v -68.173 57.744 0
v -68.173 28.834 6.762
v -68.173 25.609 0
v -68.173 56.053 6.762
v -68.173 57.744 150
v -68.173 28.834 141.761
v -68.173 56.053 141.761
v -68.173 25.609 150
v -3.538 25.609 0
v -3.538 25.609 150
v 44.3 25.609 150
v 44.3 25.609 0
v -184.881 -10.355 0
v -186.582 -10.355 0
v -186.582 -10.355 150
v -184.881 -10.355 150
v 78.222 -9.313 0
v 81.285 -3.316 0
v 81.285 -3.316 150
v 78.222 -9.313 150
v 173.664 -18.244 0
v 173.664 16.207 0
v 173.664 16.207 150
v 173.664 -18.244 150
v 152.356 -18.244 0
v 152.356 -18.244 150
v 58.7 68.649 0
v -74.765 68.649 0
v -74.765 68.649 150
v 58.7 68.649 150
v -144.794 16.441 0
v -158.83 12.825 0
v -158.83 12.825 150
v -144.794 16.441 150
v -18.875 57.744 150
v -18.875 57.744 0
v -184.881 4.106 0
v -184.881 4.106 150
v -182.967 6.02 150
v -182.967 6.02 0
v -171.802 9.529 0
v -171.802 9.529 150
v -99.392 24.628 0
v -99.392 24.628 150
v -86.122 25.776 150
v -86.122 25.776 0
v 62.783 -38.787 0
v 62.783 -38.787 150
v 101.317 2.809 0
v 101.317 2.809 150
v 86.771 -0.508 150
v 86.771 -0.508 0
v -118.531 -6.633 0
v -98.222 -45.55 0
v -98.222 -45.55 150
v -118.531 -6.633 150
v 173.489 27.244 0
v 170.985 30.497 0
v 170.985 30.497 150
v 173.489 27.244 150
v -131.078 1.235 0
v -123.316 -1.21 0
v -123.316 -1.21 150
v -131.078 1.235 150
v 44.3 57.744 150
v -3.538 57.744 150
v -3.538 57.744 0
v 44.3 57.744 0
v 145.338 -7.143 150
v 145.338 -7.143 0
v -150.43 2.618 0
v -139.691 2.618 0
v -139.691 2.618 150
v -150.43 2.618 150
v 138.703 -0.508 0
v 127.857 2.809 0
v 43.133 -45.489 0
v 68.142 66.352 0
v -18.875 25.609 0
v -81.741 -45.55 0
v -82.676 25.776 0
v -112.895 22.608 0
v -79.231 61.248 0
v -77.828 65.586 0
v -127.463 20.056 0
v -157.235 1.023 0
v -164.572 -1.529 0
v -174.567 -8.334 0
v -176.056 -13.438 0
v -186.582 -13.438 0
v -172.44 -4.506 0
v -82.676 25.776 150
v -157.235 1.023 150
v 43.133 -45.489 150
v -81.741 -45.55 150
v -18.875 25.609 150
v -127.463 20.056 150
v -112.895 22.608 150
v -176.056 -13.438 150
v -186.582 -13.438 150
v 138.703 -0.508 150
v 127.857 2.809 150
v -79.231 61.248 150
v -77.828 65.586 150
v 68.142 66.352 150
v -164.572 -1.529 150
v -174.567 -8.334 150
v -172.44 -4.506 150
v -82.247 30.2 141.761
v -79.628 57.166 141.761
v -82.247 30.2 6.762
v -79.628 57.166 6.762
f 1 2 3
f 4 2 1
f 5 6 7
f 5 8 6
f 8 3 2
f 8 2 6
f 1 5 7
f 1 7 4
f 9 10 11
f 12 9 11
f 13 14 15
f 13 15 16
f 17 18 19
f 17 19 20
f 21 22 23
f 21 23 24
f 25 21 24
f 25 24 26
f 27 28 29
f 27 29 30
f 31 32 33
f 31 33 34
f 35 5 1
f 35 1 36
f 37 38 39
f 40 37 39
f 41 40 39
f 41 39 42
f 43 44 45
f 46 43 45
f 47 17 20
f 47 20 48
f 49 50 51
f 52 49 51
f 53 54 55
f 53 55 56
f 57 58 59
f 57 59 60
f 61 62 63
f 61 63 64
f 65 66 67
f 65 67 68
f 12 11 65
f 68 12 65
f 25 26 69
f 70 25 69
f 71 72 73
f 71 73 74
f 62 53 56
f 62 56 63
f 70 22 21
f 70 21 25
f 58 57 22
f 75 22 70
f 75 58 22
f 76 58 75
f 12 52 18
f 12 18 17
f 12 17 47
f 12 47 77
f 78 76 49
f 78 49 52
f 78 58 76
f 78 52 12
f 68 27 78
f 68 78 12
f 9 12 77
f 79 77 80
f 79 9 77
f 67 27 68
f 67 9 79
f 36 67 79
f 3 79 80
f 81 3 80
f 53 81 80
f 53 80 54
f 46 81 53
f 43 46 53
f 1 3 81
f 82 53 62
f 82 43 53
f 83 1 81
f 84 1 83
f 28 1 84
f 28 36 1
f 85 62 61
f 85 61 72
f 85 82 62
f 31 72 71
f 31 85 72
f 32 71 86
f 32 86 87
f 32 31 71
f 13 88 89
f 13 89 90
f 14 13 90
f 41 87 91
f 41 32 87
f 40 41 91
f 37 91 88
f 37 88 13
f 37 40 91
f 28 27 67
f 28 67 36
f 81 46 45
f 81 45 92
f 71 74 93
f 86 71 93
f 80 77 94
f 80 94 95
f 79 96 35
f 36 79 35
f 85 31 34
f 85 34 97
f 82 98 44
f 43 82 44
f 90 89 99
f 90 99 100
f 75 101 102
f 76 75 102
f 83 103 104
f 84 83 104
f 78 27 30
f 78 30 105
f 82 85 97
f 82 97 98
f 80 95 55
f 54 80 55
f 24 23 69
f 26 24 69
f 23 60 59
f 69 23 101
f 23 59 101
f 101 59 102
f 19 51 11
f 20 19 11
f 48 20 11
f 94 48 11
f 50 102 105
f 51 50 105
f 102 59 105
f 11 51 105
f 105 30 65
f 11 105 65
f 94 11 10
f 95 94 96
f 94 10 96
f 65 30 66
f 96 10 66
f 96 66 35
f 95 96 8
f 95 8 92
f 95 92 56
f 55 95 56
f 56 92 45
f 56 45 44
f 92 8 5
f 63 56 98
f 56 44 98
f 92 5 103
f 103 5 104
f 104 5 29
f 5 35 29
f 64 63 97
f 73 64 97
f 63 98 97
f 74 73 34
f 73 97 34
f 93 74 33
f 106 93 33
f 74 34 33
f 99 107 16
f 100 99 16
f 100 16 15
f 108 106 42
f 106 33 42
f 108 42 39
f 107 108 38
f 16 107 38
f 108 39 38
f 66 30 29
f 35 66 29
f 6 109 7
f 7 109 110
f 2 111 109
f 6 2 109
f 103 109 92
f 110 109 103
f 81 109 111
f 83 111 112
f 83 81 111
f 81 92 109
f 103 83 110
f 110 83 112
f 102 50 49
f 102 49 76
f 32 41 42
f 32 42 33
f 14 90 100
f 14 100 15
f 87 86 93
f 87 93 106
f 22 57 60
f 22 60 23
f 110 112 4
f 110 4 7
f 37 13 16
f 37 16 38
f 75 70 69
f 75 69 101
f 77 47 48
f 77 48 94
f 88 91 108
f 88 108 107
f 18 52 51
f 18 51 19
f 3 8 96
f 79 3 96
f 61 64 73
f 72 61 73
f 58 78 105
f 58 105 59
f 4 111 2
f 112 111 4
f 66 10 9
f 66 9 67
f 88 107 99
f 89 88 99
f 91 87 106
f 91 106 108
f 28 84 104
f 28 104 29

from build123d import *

# Parameters (mm, degrees)
EXTRUDE1_DEPTH     = 150
SKETCH2_W          = 49.298496038
SKETCH2_H          = 32.135315936
SKETCH2_W_2        = 47.837799858
CUT_EXTRUDE1_DEPTH = 150
SKETCH3_W          = 134.99868738
SKETCH3_H          = 27.09229113
CUT_EXTRUDE2_DEPTH = 20


with BuildPart() as part:
    # Sketch1 → Extrude1 (new body)
    with BuildSketch(Plane.XY):
        Polygon((-118.530936898, -6.633049378), (-123.315790789, -1.210214968), (-131.077887101, 1.235377021), (-139.690624105, 2.617668145), (-150.429962839, 2.617668145), (-157.235088373, 1.022716848), (-164.571864339, -1.529205227), (-172.440290738, -4.506447648), (-174.566892467, -8.334330761), (-176.055513678, -13.438174912), (-186.582192239, -13.438174912), (-186.582192239, -10.354602404), (-184.880910855, -10.354602404), (-184.880910855, 4.106289356), (-182.966969299, 6.020230912), (-171.802310219, 9.529123766), (-158.83003967, 12.825356447), (-144.794468256, 16.440579387), (-127.462664161, 20.055802326), (-112.895442315, 22.607724402), (-99.391521333, 24.627996045), (-86.121526623, 25.776360974), (-82.676431684, 25.776360974), (-79.231336746, 61.248079229), (-77.827779548, 65.58634693), (-74.765472936, 68.648653542), (58.700056904, 68.648653542), (68.142168958, 66.351923583), (170.984632679, 30.497417), (173.488753661, 27.243716225), (173.664150964, 16.206652811), (173.664150964, -18.244296574), (152.355600789, -18.244296574), (145.337814803, -7.143435106), (138.702817143, -0.508437446), (127.857147893, 2.809061383), (115.480325336, 2.809061383), (101.317157255, 2.809061383), (86.771200848, -0.508437446), (81.284568168, -3.315551841), (78.222261556, -9.312568956), (62.783132387, -38.787270097), (43.133331627, -45.489442613), (-81.740726979, -45.549861026), (-98.221890382, -45.549861026), align=None)
    extrude(amount=EXTRUDE1_DEPTH)

    # Sketch2 → Cut-Extrude1 (cut)
    with BuildSketch(Plane.XY.offset(150)):
        with Locations((-43.524186177, 41.676254948)):
            Rectangle(SKETCH2_W, SKETCH2_H)
        with Locations((20.38127165, 41.676254948)):
            Rectangle(SKETCH2_W_2, SKETCH2_H)
    extrude(amount=-CUT_EXTRUDE1_DEPTH, mode=Mode.SUBTRACT)

    # Sketch3 → Cut-Extrude2 (cut)
    with BuildSketch(Plane(origin=(-84.383919497, 8.195560527, 0), x_dir=(0, 0, 1), z_dir=(-0.995316735, 0.096667453, 0))):
        with Locations((74.261219998, 35.654596801)):
            Rectangle(SKETCH3_W, SKETCH3_H)
    extrude(amount=-CUT_EXTRUDE2_DEPTH, mode=Mode.SUBTRACT)


solid = part.part
